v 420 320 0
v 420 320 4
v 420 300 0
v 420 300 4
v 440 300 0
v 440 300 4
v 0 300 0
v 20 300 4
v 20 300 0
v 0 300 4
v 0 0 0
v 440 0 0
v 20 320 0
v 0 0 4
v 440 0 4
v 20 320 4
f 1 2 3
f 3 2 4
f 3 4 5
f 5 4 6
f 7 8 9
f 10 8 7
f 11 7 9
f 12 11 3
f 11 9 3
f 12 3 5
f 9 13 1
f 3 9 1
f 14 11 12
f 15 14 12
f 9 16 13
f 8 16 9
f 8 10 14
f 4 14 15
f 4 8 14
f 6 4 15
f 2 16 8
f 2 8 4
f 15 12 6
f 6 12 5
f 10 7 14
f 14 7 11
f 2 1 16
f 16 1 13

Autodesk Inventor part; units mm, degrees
ref_plane "YZ Plane" through (0, 0, 0) normal (1, 0, 0) x (0, 1, 0)
ref_plane "XZ Plane" through (0, 0, 0) normal (0, 1, 0) x (-1, 0, 0)
ref_plane "XY Plane" through (0, 0, 0) normal (0, 0, 1) x (1, 0, 0)
sketch "スケッチ1" plane through (0, 0, 0) normal (0, 0, 1) x (1, 0, 0)
  line L0 (0, 0) -> (440, 0)
  line L1 (440, 0) -> (440, 320)
  line L2 (440, 320) -> (0, 320)
  line L3 (0, 320) -> (0, 0)
  dimension "d0" = 440
  dimension "d1" = 320
extrude "押し出し1" add sketch "スケッチ1" along normal blind 4
sketch "スケッチ2" plane through (0, 0, 4) normal (0, 0, 1) x (1, 0, 0)
  line L0 (440, 320) -> (0, 320) projected
  line L1 (0, 320) -> (20, 320)
  line L2 (20, 320) -> (20, 300)
  line L3 (20, 300) -> (0, 300)
  line L4 (0, 300) -> (0, 320)
  line L5 (440, 320) -> (420, 320)
  line L6 (420, 320) -> (420, 300)
  line L7 (420, 300) -> (440, 300)
  line L8 (440, 300) -> (440, 320)
  point P0 (0, 0)
  dimension "d4" = 20
extrude "押し出し2" cut sketch "スケッチ2" against normal blind 10
properties part number "防水p3"
